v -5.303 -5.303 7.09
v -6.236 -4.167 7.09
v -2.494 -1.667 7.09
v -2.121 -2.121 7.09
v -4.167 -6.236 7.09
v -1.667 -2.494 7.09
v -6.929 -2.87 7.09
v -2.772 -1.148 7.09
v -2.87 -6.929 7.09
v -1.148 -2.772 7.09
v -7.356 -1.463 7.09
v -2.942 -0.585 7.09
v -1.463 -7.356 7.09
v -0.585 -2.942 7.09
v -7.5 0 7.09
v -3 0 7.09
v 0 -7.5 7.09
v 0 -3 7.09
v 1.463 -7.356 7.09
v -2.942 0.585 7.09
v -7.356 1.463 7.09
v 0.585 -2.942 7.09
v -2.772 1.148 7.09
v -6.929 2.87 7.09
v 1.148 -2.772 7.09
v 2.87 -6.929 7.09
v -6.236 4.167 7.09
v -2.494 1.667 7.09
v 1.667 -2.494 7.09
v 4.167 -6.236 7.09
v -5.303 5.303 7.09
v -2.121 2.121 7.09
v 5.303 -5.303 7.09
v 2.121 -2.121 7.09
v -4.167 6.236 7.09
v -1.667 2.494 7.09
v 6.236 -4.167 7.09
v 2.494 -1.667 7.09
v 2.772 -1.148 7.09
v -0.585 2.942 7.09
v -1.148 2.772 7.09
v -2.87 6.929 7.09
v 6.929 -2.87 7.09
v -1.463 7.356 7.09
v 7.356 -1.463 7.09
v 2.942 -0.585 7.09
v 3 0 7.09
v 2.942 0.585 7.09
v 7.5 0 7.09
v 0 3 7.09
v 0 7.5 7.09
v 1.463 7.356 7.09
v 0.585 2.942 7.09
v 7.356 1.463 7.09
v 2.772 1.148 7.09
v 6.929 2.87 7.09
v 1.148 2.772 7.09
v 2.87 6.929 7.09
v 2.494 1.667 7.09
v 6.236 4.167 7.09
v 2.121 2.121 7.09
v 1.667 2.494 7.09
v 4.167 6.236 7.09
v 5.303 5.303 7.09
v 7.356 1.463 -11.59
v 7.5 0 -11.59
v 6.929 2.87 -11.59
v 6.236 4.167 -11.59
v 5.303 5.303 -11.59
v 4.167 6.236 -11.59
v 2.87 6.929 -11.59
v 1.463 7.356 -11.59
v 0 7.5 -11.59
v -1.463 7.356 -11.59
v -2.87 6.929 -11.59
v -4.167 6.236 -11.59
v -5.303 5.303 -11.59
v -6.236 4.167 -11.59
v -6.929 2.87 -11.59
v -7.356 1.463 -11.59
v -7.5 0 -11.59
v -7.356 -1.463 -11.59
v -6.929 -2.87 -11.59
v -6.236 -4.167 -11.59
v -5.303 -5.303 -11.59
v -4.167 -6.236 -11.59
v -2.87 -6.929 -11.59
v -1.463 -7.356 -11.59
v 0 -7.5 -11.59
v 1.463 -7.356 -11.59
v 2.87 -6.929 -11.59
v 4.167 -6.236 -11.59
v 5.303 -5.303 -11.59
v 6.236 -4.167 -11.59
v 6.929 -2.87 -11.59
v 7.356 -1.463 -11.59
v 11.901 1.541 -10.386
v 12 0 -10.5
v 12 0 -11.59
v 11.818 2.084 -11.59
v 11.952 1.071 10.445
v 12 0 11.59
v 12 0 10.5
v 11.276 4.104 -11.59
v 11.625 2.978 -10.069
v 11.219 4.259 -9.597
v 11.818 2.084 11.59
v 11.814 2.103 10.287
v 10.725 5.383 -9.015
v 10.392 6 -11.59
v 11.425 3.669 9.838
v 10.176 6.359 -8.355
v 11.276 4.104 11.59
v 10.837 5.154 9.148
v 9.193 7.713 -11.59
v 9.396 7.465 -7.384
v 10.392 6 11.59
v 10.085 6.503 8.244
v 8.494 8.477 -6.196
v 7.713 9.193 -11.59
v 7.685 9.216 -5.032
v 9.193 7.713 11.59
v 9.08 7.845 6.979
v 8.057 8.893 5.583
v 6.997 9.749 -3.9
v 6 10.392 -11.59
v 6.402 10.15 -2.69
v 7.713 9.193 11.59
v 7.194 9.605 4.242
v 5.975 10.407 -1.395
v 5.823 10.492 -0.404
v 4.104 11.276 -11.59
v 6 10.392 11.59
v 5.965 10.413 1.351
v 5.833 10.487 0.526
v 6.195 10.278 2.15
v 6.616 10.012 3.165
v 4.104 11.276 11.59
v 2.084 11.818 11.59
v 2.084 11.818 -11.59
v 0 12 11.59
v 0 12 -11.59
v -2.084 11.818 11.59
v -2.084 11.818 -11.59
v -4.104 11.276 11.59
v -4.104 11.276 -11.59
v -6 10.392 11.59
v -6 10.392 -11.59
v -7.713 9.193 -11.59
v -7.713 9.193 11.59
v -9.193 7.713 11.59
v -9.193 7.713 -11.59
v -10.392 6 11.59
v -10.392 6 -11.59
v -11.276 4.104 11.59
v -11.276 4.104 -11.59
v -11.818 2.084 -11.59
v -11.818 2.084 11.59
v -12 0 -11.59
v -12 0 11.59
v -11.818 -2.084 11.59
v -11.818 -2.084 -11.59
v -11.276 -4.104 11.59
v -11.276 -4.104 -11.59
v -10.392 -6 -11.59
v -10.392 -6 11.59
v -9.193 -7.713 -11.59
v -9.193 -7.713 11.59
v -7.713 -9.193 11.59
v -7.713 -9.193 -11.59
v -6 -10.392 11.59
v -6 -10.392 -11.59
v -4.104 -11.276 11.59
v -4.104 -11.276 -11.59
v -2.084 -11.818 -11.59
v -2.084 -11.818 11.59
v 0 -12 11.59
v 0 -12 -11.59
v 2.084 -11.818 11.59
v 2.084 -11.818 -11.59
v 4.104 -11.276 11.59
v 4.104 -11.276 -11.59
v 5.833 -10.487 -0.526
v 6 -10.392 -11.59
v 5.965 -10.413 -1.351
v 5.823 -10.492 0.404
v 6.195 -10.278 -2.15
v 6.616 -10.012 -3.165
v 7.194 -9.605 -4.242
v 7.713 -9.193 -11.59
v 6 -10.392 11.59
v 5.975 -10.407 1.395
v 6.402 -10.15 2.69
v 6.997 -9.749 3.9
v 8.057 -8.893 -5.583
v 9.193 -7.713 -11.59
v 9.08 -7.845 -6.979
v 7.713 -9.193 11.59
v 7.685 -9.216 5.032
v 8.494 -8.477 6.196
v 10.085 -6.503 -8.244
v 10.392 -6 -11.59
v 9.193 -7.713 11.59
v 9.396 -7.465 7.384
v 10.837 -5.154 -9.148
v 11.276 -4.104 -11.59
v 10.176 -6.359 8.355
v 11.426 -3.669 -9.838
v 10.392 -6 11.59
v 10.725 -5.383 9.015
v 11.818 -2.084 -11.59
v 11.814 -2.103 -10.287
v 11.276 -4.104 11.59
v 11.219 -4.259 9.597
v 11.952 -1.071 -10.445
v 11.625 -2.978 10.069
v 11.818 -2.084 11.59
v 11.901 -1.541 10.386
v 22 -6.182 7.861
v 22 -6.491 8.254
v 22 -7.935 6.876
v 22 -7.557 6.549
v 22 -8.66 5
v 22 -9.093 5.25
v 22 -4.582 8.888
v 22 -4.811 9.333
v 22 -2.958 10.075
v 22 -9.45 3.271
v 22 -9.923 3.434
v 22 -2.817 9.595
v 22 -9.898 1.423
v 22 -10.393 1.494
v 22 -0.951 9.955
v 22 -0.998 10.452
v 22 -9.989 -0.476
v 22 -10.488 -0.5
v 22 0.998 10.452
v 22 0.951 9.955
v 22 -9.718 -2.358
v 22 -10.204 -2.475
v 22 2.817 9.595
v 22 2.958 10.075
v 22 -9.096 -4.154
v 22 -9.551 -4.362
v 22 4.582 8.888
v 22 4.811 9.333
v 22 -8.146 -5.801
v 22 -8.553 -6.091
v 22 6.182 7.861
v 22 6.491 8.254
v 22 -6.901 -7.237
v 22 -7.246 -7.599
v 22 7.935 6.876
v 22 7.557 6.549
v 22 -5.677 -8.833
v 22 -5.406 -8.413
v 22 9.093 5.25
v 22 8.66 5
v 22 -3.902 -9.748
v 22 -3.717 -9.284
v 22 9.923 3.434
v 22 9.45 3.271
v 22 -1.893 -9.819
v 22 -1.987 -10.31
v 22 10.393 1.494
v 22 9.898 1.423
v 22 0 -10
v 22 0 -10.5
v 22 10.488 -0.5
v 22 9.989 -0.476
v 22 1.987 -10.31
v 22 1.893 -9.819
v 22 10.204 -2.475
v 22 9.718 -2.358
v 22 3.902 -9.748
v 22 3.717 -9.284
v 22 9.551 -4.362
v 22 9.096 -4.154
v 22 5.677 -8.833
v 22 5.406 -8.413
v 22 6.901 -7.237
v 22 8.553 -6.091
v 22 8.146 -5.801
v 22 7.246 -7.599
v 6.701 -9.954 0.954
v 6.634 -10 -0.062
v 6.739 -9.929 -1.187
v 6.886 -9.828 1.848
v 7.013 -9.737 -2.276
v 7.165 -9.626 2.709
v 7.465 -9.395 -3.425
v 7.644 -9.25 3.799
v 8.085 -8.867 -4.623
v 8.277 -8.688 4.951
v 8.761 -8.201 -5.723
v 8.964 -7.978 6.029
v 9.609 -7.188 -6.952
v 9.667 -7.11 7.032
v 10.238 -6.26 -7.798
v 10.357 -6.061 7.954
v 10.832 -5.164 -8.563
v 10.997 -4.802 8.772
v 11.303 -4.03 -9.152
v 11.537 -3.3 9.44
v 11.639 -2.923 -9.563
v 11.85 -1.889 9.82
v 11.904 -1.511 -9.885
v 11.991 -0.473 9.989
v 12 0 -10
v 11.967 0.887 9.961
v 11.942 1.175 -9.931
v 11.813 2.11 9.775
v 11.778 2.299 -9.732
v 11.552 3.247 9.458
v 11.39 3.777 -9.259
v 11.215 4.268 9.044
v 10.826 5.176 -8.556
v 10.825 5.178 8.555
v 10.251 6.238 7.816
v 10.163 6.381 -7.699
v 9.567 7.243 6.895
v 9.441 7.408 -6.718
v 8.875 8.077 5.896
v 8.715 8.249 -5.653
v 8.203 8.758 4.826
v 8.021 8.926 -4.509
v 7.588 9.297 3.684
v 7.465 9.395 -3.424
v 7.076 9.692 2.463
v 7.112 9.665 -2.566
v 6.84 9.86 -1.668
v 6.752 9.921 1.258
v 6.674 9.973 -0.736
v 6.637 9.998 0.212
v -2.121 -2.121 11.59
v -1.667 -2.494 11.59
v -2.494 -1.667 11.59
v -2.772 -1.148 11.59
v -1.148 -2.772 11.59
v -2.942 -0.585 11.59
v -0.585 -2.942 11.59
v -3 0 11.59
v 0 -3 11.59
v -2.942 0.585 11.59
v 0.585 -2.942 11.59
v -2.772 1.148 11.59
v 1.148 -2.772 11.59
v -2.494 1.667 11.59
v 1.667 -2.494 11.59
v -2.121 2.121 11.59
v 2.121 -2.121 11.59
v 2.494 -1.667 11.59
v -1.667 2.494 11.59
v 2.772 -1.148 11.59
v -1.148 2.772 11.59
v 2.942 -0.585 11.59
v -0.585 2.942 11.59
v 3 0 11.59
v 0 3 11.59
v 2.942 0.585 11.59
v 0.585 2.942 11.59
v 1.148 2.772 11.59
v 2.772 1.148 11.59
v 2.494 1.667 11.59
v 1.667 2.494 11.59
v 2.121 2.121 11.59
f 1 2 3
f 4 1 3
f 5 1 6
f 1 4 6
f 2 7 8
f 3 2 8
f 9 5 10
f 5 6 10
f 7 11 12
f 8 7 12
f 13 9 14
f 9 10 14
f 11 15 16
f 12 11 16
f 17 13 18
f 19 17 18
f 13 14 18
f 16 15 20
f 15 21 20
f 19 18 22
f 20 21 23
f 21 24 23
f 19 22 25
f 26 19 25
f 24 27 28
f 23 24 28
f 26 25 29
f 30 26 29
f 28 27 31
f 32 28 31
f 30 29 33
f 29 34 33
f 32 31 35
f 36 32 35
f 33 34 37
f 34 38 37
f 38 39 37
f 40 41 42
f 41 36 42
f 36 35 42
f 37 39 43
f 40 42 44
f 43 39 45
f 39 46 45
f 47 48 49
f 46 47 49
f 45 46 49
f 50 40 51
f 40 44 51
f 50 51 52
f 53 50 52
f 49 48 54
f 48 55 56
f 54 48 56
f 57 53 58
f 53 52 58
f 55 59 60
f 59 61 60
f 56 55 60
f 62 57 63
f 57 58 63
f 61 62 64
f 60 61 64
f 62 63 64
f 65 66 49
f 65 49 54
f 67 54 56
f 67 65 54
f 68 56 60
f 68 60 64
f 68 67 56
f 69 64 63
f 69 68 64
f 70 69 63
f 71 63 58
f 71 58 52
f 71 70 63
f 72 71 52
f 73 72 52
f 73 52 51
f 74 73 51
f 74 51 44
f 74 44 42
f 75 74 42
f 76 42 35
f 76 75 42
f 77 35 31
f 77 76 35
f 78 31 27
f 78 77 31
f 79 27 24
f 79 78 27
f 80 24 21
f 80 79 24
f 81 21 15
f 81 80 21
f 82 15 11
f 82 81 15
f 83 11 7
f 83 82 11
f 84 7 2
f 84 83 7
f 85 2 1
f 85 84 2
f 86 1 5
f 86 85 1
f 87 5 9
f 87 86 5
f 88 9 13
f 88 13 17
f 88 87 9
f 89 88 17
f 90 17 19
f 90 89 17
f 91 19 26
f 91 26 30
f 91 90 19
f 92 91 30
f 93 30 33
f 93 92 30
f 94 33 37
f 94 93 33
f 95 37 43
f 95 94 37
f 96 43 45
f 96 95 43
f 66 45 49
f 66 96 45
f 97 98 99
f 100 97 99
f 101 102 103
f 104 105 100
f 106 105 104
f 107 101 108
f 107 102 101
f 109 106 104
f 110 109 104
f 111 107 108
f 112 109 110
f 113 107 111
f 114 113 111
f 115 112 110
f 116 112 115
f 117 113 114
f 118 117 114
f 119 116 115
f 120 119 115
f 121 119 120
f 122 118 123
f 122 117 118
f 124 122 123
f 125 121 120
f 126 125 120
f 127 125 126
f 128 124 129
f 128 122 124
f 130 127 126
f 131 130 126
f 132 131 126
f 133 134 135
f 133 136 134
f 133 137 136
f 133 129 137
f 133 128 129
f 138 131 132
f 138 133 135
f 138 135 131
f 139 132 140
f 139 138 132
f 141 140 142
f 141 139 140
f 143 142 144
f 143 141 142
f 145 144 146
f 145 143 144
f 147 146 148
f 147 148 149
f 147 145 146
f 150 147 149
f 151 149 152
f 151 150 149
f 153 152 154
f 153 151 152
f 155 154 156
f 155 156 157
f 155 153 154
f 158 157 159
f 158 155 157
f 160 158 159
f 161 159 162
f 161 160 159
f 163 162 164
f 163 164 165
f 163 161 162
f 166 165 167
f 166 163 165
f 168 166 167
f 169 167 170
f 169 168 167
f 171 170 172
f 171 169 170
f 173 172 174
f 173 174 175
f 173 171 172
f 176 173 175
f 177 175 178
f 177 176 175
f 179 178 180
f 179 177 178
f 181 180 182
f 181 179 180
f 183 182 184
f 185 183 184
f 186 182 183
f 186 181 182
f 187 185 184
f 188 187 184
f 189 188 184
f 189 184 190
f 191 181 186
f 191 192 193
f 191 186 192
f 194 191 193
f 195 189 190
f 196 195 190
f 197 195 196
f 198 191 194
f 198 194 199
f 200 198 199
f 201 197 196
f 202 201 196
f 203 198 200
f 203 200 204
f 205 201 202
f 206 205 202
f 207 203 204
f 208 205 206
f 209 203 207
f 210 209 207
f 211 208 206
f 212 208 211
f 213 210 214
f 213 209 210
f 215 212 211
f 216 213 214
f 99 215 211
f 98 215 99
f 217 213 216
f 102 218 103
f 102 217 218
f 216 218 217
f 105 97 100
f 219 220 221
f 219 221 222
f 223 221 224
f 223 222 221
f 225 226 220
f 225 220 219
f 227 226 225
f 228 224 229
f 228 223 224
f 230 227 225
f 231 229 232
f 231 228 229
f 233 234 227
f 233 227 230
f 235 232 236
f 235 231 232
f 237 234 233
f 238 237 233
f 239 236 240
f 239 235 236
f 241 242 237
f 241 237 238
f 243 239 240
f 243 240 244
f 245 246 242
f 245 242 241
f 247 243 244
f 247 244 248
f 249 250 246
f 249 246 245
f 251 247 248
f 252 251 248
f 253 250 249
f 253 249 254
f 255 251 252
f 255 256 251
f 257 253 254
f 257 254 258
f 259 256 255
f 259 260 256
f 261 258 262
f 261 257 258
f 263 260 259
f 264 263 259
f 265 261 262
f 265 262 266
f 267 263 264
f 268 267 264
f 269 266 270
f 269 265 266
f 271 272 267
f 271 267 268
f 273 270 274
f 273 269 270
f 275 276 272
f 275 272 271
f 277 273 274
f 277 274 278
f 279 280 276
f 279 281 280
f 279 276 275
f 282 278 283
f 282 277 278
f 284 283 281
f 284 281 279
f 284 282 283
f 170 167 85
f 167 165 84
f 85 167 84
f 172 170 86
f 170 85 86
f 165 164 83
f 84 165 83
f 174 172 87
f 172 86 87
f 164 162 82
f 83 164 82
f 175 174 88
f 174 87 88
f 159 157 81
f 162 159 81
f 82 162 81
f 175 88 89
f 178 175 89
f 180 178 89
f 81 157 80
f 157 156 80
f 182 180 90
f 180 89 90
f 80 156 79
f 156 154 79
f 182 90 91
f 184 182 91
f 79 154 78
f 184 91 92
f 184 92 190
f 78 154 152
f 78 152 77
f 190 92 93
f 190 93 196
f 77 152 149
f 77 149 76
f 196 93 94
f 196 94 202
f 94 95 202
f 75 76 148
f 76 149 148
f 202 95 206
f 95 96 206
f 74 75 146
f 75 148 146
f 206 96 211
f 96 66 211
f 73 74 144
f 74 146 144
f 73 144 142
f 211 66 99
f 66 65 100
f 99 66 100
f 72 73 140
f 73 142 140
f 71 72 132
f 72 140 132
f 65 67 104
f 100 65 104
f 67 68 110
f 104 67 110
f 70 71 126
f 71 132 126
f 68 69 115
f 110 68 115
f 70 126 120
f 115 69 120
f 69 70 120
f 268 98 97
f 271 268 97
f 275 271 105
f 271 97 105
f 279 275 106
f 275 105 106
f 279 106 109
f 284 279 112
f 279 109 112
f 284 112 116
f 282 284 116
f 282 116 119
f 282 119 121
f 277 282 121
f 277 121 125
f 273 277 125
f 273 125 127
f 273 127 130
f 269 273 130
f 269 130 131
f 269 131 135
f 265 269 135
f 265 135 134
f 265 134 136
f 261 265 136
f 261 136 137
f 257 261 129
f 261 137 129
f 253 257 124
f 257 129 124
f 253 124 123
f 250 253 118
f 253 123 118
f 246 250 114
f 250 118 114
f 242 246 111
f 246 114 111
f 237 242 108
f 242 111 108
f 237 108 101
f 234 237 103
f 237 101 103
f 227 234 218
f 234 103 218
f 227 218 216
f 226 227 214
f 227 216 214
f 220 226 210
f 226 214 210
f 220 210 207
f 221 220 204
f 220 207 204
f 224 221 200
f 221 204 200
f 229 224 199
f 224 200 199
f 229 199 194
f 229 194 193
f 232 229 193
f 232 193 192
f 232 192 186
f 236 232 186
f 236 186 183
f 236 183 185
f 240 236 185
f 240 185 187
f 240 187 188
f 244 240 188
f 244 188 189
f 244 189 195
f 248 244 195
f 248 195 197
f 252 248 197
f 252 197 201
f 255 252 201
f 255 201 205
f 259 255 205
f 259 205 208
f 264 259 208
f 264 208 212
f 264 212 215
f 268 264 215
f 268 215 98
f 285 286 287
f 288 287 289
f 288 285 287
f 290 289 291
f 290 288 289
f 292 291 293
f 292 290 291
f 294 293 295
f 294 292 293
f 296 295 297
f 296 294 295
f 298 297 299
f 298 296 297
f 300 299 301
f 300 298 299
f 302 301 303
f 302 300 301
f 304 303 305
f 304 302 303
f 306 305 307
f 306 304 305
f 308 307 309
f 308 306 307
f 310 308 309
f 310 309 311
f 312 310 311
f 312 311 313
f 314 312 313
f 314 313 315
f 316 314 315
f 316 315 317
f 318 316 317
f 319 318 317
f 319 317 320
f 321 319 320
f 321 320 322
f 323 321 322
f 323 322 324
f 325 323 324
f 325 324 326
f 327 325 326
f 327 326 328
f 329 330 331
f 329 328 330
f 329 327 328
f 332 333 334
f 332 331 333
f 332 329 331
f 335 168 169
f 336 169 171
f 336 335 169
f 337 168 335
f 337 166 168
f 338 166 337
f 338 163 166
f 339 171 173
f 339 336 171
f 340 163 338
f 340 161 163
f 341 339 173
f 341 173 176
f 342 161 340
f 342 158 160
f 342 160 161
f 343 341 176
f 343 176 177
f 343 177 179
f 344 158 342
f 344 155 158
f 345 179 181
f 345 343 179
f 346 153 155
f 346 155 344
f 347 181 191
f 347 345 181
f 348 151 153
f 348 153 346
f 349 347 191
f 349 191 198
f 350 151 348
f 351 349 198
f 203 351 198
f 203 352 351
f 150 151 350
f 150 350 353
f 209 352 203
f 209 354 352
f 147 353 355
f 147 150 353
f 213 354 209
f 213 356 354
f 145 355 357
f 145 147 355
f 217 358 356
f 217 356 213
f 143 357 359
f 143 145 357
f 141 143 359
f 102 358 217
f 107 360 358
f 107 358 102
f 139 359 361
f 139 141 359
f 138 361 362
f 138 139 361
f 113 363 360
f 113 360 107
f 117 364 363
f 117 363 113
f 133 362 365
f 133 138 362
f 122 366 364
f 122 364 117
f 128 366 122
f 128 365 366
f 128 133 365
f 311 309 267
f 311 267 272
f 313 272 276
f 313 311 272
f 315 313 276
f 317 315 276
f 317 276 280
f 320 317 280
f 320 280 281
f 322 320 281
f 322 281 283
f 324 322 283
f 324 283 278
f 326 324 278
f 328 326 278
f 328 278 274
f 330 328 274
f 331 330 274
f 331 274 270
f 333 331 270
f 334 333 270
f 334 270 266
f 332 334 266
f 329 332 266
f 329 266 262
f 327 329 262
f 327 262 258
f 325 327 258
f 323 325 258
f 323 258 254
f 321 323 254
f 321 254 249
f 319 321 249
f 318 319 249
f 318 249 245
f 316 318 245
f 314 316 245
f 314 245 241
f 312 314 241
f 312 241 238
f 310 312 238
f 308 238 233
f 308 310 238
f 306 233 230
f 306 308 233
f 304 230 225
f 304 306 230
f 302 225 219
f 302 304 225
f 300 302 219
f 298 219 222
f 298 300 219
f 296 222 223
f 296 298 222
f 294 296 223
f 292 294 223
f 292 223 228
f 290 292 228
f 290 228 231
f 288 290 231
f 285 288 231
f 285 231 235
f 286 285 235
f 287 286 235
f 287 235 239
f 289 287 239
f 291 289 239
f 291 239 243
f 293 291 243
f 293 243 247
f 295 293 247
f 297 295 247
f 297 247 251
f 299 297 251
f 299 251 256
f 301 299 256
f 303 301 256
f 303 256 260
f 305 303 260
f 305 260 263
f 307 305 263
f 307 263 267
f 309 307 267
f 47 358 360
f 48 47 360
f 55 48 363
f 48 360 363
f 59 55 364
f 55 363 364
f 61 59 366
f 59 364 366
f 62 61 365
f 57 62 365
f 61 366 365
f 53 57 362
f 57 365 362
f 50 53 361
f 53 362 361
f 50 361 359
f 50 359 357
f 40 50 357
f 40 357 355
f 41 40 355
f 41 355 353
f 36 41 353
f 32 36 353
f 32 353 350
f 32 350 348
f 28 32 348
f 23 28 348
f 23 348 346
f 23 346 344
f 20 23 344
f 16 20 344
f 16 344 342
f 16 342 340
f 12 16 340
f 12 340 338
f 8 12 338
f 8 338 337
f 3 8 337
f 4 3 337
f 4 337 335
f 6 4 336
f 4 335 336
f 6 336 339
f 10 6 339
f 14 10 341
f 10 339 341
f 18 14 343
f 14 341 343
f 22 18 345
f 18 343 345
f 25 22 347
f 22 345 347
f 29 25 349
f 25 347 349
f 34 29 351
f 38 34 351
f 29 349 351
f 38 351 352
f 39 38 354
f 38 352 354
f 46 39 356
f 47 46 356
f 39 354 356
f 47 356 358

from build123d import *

# Parameters (mm, degrees)
SKETCH1_R           = 12
BOSS_EXTRUDE1_DEPTH = 11.59
SKETCH3_R           = 10.5
SKETCH3_R_2         = 10
EXTRUDE_THIN1_DEPTH = 22
SHELL1_START        = -11.59
SHELL1_OUTLINE_R    = 7.5
SHELL1_DEPTH        = 18.68
CUT_EXTRUDE1_REACH  = 36.137
SKETCH4_R           = 3


# Read off the part's stored shape, not the designer's step: Shell1
with BuildPart() as part:
    # Sketch1 → Boss-Extrude1 (new, symmetric)
    with BuildSketch(Plane.XY):
        Circle(SKETCH1_R)
    extrude(amount=BOSS_EXTRUDE1_DEPTH, both=True)

    # Sketch3 → Extrude-Thin1 (add)
    with BuildSketch(Plane(origin=(0, 0, 0), x_dir=(0, 0, -1), z_dir=(1, 0, 0))):
        Circle(SKETCH3_R)
        Circle(SKETCH3_R_2, mode=Mode.SUBTRACT)
    extrude(amount=EXTRUDE_THIN1_DEPTH)

    # Shell1 outline → Shell1 (cut)
    with BuildSketch(Plane.XY.offset(SHELL1_START)):
        Circle(SHELL1_OUTLINE_R)
    extrude(amount=SHELL1_DEPTH, mode=Mode.SUBTRACT)

    # Sketch4 → Cut-Extrude1 (cut, up to next)
    with BuildSketch(Plane.XY.offset(11.59), mode=Mode.PRIVATE) as cut_extrude1_sk1:
        Circle(SKETCH4_R)
    cut_extrude1_tool1 = extrude(cut_extrude1_sk1.sketch, amount=-CUT_EXTRUDE1_REACH, mode=Mode.PRIVATE) & part.part
    add(cut_extrude1_tool1.solids().sort_by_distance((0, 0, 11.59))[0], mode=Mode.SUBTRACT)


solid = part.part
